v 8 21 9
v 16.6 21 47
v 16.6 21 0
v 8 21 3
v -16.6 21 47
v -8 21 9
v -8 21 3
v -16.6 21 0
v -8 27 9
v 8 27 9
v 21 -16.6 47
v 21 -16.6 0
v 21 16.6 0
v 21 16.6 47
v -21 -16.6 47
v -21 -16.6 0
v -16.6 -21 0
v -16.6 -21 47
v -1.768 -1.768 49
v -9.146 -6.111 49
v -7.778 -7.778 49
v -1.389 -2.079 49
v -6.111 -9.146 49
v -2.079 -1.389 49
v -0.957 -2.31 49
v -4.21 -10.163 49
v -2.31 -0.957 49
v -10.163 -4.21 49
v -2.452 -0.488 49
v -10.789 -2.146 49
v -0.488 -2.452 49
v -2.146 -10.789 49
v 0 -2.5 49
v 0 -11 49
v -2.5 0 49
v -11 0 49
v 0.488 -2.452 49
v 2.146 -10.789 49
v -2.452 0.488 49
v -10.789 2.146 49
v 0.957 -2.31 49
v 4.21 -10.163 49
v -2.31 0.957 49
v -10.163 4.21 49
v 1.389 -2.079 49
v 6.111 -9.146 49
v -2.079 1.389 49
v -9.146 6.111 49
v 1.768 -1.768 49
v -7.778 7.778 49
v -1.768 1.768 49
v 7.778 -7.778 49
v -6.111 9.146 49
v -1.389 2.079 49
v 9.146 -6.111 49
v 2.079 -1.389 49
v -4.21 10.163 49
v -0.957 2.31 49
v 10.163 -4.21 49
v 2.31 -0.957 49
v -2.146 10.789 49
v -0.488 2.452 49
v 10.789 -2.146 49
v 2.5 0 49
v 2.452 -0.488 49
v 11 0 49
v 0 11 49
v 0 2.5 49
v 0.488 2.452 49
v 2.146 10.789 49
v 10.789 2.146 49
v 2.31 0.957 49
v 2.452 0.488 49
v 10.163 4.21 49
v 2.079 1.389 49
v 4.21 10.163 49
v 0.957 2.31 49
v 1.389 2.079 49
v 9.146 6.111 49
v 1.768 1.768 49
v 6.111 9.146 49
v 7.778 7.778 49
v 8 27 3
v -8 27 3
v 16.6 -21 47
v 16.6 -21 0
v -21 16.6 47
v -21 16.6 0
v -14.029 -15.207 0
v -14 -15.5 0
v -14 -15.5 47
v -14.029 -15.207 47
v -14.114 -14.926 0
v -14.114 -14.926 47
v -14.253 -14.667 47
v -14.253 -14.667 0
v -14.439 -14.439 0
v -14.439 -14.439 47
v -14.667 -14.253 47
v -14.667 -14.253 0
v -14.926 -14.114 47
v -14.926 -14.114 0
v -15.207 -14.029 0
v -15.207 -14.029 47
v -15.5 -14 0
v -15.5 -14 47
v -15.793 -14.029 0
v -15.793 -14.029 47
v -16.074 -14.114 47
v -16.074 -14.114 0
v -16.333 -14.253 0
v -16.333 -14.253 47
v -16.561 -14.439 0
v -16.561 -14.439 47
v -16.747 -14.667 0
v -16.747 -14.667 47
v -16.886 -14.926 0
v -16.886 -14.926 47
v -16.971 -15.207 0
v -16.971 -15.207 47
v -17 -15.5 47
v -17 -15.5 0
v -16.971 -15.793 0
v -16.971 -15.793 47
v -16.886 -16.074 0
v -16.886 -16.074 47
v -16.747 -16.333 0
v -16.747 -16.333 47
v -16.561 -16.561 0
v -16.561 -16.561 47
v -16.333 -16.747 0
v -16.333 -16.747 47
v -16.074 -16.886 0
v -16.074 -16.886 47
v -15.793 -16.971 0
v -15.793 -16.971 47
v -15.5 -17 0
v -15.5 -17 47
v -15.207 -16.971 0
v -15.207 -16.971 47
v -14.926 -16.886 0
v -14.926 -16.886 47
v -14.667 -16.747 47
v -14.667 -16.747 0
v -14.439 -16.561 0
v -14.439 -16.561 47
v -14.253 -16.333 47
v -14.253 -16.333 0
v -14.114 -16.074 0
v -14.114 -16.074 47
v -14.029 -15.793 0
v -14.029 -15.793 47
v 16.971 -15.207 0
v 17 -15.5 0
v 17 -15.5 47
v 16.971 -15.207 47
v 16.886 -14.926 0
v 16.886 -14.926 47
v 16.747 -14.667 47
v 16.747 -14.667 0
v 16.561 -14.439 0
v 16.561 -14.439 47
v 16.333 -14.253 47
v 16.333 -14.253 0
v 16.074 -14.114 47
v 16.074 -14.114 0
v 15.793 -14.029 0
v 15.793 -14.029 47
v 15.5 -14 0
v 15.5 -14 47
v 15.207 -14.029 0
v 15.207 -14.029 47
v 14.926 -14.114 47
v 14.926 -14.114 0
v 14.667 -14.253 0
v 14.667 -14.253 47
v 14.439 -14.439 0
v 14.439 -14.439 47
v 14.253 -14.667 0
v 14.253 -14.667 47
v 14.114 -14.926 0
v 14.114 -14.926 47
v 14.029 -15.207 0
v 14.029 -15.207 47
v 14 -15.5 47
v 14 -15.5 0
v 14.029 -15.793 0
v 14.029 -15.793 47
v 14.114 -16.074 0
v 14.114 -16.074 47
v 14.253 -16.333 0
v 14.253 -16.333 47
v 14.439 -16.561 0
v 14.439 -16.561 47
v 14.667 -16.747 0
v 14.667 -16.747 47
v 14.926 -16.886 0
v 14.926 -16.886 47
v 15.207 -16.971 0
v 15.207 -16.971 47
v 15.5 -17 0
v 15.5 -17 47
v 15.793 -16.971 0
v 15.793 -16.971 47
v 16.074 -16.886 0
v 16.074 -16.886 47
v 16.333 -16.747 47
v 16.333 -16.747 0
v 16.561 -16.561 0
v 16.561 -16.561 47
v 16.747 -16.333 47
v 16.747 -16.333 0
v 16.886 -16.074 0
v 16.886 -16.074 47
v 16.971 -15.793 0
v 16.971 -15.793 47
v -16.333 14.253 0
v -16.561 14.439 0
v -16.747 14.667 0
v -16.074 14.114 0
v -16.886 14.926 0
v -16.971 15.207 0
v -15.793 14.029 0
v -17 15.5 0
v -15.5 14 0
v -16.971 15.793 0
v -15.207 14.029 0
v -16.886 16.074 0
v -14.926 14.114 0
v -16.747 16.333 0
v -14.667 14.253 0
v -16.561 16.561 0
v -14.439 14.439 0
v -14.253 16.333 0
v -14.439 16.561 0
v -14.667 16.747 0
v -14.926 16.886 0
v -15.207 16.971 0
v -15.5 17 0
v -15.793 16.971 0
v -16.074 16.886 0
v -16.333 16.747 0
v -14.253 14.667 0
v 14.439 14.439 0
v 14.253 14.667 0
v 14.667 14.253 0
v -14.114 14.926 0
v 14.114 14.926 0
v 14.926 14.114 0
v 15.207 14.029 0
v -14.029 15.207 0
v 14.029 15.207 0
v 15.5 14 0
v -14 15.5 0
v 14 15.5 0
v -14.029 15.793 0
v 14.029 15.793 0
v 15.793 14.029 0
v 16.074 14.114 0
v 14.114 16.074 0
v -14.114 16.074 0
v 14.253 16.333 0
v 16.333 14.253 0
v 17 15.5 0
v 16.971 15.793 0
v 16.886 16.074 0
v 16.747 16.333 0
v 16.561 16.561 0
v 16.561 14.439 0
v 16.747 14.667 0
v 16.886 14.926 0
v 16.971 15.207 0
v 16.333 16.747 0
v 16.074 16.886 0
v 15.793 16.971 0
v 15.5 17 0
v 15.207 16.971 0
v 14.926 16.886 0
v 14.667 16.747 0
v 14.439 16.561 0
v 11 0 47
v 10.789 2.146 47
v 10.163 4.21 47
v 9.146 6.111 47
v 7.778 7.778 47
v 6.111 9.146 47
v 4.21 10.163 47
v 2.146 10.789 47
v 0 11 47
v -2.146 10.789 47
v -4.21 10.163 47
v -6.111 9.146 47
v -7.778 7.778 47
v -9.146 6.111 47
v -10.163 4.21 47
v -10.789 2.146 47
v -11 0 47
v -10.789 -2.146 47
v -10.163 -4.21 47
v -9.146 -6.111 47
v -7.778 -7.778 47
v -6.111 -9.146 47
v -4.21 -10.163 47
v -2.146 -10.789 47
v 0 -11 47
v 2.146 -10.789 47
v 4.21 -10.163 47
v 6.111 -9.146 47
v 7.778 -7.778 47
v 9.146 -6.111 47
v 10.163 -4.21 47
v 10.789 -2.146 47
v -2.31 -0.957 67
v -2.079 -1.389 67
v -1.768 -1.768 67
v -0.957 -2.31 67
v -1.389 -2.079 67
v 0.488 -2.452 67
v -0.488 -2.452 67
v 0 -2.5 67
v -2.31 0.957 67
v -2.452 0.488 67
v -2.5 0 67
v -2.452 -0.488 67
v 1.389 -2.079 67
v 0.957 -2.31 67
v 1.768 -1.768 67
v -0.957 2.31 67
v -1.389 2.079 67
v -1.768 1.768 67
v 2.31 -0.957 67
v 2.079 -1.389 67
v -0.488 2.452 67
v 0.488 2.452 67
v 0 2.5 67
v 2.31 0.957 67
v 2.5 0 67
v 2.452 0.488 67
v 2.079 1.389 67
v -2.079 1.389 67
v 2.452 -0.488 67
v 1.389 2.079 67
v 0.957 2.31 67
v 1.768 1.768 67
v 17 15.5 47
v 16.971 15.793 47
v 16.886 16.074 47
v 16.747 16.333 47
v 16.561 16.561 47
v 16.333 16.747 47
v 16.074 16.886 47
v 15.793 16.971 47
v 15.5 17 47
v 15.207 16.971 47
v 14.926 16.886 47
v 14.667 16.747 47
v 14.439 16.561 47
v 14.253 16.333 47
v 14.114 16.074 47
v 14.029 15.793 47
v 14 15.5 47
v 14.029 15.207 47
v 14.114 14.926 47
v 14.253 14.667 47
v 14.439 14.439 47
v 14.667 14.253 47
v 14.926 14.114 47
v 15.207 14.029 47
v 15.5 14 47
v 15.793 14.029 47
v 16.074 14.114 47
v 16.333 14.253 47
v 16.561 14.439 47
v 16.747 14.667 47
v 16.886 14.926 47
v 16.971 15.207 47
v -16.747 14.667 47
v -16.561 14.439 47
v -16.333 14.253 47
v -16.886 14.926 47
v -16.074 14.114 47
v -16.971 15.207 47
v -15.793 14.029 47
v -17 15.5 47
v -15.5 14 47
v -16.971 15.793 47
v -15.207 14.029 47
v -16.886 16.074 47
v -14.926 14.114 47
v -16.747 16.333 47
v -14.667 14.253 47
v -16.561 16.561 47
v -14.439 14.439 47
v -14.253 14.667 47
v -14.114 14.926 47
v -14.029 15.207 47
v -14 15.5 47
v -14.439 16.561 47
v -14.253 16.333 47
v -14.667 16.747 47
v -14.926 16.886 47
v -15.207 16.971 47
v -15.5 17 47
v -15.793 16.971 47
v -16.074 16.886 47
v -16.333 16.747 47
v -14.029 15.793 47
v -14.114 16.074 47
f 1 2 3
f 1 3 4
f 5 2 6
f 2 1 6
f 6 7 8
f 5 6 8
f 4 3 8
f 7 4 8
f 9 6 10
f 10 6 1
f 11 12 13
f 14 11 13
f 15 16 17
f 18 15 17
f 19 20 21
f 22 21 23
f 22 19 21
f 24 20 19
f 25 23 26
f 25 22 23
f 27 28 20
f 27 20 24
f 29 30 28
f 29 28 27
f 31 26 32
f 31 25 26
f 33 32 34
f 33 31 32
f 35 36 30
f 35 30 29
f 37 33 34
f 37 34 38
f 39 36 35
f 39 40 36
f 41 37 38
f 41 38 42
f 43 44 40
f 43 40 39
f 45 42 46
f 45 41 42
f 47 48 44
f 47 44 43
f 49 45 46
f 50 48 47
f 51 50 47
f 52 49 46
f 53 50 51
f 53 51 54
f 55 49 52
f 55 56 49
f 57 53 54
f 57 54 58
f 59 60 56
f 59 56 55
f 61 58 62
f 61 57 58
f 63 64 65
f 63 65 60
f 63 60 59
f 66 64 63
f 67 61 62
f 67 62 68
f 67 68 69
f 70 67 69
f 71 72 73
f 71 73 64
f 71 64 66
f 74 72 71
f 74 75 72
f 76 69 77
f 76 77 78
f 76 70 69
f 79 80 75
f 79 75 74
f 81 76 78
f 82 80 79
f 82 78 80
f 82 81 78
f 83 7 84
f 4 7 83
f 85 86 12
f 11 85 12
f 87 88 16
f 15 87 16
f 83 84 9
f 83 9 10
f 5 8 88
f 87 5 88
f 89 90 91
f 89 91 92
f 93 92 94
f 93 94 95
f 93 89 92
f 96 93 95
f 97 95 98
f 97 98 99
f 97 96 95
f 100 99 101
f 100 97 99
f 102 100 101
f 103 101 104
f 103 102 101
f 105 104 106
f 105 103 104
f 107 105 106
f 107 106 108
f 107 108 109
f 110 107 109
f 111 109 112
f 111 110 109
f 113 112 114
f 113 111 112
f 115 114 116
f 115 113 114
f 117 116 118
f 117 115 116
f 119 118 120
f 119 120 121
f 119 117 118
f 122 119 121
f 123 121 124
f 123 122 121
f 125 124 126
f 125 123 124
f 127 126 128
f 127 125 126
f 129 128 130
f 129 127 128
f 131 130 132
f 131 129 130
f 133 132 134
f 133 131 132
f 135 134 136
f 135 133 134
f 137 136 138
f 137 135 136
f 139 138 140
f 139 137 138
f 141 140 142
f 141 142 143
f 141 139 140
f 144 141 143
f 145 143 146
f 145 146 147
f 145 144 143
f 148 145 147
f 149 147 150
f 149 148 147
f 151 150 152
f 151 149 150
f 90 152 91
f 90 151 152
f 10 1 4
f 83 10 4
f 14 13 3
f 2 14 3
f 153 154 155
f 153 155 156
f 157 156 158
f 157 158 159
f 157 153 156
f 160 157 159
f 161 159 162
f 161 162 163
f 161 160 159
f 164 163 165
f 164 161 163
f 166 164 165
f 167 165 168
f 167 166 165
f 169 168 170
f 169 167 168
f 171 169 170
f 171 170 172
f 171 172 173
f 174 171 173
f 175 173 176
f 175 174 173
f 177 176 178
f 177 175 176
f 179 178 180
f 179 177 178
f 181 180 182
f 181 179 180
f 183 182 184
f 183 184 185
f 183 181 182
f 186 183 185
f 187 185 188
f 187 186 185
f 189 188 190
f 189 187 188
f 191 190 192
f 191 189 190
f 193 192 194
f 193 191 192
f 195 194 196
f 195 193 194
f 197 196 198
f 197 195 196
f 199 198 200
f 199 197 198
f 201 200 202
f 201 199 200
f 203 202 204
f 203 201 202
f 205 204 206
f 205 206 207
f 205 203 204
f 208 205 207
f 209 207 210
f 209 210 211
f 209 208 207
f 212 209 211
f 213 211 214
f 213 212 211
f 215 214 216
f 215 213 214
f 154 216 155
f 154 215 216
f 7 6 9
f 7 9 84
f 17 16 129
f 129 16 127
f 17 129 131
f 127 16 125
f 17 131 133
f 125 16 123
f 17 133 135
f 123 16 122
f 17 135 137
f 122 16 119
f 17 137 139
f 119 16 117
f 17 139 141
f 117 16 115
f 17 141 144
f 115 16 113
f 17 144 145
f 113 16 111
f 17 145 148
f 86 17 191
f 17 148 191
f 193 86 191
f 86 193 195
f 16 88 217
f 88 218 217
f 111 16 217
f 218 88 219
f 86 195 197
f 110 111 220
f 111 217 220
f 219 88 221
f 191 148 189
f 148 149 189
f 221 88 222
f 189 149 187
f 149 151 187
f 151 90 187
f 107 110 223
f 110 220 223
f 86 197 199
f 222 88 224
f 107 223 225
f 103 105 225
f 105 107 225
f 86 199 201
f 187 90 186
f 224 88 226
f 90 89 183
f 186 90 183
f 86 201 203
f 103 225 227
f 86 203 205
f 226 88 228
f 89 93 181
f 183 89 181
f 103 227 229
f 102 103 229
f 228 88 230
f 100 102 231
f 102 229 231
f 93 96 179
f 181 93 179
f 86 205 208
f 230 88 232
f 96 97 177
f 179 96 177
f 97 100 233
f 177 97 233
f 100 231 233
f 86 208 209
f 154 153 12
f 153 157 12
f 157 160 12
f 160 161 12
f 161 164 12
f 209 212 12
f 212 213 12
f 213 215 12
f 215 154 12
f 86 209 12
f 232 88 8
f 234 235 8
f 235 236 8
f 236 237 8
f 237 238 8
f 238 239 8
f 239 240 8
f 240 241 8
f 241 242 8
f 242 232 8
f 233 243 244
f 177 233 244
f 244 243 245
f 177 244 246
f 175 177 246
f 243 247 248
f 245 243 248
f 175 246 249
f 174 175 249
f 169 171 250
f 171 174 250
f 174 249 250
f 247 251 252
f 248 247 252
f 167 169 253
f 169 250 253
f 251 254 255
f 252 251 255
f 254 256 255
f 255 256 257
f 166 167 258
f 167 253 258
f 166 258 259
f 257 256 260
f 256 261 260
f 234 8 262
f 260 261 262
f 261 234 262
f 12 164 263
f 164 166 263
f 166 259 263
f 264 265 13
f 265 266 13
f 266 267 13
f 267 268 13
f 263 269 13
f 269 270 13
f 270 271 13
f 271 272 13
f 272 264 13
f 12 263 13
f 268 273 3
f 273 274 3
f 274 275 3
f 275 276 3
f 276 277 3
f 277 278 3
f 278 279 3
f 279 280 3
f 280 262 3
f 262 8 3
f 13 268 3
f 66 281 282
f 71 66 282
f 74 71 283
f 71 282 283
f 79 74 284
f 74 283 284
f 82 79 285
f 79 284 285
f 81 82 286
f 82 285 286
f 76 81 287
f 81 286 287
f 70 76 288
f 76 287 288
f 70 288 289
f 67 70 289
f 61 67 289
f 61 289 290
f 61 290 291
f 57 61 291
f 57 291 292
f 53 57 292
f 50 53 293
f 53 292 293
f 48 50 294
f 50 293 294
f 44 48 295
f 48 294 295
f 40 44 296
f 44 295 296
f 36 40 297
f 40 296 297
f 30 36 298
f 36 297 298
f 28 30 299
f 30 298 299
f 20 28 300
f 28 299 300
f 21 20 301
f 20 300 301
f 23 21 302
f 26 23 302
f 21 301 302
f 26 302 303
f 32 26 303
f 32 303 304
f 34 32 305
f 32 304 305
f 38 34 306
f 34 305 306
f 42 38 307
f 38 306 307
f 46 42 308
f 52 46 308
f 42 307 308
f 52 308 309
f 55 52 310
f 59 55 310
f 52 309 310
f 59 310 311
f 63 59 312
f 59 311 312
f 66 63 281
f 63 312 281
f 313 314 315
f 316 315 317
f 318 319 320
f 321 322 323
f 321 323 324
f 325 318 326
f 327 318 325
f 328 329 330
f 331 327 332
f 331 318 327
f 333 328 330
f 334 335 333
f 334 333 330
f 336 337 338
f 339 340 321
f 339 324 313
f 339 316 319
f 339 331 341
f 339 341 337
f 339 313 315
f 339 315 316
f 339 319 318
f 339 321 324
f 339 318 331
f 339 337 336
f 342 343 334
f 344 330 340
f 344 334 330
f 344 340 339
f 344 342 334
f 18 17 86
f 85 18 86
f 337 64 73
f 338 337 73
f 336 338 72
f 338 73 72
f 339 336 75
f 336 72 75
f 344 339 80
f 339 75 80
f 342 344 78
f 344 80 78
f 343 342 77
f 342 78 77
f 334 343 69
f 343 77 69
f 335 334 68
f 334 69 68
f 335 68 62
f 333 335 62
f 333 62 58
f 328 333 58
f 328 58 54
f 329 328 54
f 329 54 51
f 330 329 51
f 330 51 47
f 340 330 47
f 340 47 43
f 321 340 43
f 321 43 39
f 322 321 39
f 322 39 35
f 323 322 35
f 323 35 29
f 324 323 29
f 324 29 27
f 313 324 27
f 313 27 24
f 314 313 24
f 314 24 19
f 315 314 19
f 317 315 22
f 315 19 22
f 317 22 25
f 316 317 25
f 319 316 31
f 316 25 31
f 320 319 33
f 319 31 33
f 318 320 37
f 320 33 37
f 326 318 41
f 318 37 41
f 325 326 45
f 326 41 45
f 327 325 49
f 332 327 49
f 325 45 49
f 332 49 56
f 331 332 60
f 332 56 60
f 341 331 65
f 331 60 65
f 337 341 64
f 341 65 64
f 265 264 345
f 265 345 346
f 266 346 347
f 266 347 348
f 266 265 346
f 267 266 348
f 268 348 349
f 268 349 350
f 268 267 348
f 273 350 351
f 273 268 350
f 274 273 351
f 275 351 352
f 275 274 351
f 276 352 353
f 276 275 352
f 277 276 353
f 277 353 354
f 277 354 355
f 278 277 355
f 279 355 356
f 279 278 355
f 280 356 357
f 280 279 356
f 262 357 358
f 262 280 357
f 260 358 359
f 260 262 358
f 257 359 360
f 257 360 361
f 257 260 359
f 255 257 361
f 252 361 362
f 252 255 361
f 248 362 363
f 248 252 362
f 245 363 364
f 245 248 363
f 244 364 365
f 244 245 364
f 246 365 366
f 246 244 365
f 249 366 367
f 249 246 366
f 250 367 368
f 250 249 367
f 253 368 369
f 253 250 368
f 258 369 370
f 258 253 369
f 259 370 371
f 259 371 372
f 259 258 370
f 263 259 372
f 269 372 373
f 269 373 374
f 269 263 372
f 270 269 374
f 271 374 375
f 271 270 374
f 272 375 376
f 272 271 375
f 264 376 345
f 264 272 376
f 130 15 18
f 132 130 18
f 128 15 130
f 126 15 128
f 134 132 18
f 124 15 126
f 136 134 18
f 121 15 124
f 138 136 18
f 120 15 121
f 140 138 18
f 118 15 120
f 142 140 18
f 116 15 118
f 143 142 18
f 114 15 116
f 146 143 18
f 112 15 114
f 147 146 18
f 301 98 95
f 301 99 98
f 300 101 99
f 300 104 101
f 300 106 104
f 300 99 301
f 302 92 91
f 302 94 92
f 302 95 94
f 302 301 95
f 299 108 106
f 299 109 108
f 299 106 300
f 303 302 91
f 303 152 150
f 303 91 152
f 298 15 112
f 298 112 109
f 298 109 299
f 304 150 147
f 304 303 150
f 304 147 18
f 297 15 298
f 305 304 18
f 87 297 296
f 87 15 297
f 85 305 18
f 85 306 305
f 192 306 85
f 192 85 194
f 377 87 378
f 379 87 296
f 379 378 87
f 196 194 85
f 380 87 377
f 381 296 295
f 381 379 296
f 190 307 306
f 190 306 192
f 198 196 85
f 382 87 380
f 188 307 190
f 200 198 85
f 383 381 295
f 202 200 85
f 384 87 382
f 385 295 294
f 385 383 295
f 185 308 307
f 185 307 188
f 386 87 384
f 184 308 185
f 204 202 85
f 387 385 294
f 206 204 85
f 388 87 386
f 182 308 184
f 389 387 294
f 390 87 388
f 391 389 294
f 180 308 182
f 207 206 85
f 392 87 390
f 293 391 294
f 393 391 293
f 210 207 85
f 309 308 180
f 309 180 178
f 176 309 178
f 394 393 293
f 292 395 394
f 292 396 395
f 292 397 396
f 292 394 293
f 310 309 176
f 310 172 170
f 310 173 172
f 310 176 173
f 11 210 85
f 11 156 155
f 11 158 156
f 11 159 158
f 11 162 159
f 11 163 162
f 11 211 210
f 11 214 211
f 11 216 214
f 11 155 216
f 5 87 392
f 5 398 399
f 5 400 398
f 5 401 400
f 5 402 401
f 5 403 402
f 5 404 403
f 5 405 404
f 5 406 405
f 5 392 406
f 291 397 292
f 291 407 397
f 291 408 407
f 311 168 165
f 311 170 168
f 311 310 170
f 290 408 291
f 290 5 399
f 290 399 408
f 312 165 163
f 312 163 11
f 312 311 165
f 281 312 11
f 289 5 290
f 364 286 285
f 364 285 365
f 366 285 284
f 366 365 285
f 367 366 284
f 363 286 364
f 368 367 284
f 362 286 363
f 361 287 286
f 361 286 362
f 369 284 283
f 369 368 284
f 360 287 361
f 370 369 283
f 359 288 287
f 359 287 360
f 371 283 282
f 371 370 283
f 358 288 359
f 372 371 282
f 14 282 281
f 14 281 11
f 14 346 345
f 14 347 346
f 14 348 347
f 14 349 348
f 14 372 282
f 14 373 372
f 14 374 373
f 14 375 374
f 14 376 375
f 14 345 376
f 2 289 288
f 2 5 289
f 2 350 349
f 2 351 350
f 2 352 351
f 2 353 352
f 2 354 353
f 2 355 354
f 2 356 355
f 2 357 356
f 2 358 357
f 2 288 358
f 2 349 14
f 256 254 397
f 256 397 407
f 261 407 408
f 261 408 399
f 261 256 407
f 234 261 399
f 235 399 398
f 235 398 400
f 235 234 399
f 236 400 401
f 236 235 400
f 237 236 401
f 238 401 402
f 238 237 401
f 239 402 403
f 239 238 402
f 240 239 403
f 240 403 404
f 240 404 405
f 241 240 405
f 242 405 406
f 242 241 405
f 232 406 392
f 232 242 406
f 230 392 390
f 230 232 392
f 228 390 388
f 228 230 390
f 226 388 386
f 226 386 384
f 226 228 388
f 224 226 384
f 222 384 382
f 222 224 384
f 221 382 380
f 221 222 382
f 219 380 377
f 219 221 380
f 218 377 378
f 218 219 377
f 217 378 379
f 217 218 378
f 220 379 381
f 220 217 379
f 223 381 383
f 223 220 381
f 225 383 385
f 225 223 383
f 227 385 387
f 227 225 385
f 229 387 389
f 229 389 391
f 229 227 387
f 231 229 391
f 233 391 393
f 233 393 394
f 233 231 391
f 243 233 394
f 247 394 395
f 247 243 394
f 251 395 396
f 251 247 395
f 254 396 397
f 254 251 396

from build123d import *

# Parameters (mm, degrees)
SKETCH_1_R      = 1.5
EXTRUDE_1_DEPTH = 47
SKETCH_2_R      = 11
EXTRUDE_2_DEPTH = 2
SKETCH_3_R      = 2.5
EXTRUDE_3_DEPTH = 20
SKETCH_4_W      = 16
SKETCH_4_H      = 6
EXTRUDE_4_DEPTH = 6


with BuildPart() as part:
    # 草图1 → 凸台-拉伸1 (new body)
    with BuildSketch(Plane.XY):
        Polygon((21, 0), (21, 16.6), (16.6, 21), (0, 21), (-16.6, 21), (-21, 16.6), (-21, 0), (-21, -16.6), (-16.6, -21), (0, -21), (16.6, -21), (21, -16.6), align=None)
        with Locations((15.5, 15.5)):
            Circle(SKETCH_1_R, mode=Mode.SUBTRACT)
        with Locations((15.5, -15.5)):
            Circle(SKETCH_1_R, mode=Mode.SUBTRACT)
        with Locations((-15.5, -15.5)):
            Circle(SKETCH_1_R, mode=Mode.SUBTRACT)
        with Locations((-15.5, 15.5)):
            Circle(SKETCH_1_R, mode=Mode.SUBTRACT)
    extrude(amount=EXTRUDE_1_DEPTH)

    # 草图2 → 凸台-拉伸2 (add)
    with BuildSketch(Plane.XY.offset(47)):
        Circle(SKETCH_2_R)
    extrude(amount=EXTRUDE_2_DEPTH)

    # 草图3 → 凸台-拉伸3 (add)
    with BuildSketch(Plane.XY.offset(47)):
        Circle(SKETCH_3_R)
    extrude(amount=EXTRUDE_3_DEPTH)

    # 草图4 → 凸台-拉伸4 (add)
    with BuildSketch(Plane(origin=(0, 21, 0), x_dir=(1, 0, 0), z_dir=(0, 1, 0))):
        with Locations((0, -6)):
            Rectangle(SKETCH_4_W, SKETCH_4_H)
    extrude(amount=EXTRUDE_4_DEPTH)


solid = part.part
